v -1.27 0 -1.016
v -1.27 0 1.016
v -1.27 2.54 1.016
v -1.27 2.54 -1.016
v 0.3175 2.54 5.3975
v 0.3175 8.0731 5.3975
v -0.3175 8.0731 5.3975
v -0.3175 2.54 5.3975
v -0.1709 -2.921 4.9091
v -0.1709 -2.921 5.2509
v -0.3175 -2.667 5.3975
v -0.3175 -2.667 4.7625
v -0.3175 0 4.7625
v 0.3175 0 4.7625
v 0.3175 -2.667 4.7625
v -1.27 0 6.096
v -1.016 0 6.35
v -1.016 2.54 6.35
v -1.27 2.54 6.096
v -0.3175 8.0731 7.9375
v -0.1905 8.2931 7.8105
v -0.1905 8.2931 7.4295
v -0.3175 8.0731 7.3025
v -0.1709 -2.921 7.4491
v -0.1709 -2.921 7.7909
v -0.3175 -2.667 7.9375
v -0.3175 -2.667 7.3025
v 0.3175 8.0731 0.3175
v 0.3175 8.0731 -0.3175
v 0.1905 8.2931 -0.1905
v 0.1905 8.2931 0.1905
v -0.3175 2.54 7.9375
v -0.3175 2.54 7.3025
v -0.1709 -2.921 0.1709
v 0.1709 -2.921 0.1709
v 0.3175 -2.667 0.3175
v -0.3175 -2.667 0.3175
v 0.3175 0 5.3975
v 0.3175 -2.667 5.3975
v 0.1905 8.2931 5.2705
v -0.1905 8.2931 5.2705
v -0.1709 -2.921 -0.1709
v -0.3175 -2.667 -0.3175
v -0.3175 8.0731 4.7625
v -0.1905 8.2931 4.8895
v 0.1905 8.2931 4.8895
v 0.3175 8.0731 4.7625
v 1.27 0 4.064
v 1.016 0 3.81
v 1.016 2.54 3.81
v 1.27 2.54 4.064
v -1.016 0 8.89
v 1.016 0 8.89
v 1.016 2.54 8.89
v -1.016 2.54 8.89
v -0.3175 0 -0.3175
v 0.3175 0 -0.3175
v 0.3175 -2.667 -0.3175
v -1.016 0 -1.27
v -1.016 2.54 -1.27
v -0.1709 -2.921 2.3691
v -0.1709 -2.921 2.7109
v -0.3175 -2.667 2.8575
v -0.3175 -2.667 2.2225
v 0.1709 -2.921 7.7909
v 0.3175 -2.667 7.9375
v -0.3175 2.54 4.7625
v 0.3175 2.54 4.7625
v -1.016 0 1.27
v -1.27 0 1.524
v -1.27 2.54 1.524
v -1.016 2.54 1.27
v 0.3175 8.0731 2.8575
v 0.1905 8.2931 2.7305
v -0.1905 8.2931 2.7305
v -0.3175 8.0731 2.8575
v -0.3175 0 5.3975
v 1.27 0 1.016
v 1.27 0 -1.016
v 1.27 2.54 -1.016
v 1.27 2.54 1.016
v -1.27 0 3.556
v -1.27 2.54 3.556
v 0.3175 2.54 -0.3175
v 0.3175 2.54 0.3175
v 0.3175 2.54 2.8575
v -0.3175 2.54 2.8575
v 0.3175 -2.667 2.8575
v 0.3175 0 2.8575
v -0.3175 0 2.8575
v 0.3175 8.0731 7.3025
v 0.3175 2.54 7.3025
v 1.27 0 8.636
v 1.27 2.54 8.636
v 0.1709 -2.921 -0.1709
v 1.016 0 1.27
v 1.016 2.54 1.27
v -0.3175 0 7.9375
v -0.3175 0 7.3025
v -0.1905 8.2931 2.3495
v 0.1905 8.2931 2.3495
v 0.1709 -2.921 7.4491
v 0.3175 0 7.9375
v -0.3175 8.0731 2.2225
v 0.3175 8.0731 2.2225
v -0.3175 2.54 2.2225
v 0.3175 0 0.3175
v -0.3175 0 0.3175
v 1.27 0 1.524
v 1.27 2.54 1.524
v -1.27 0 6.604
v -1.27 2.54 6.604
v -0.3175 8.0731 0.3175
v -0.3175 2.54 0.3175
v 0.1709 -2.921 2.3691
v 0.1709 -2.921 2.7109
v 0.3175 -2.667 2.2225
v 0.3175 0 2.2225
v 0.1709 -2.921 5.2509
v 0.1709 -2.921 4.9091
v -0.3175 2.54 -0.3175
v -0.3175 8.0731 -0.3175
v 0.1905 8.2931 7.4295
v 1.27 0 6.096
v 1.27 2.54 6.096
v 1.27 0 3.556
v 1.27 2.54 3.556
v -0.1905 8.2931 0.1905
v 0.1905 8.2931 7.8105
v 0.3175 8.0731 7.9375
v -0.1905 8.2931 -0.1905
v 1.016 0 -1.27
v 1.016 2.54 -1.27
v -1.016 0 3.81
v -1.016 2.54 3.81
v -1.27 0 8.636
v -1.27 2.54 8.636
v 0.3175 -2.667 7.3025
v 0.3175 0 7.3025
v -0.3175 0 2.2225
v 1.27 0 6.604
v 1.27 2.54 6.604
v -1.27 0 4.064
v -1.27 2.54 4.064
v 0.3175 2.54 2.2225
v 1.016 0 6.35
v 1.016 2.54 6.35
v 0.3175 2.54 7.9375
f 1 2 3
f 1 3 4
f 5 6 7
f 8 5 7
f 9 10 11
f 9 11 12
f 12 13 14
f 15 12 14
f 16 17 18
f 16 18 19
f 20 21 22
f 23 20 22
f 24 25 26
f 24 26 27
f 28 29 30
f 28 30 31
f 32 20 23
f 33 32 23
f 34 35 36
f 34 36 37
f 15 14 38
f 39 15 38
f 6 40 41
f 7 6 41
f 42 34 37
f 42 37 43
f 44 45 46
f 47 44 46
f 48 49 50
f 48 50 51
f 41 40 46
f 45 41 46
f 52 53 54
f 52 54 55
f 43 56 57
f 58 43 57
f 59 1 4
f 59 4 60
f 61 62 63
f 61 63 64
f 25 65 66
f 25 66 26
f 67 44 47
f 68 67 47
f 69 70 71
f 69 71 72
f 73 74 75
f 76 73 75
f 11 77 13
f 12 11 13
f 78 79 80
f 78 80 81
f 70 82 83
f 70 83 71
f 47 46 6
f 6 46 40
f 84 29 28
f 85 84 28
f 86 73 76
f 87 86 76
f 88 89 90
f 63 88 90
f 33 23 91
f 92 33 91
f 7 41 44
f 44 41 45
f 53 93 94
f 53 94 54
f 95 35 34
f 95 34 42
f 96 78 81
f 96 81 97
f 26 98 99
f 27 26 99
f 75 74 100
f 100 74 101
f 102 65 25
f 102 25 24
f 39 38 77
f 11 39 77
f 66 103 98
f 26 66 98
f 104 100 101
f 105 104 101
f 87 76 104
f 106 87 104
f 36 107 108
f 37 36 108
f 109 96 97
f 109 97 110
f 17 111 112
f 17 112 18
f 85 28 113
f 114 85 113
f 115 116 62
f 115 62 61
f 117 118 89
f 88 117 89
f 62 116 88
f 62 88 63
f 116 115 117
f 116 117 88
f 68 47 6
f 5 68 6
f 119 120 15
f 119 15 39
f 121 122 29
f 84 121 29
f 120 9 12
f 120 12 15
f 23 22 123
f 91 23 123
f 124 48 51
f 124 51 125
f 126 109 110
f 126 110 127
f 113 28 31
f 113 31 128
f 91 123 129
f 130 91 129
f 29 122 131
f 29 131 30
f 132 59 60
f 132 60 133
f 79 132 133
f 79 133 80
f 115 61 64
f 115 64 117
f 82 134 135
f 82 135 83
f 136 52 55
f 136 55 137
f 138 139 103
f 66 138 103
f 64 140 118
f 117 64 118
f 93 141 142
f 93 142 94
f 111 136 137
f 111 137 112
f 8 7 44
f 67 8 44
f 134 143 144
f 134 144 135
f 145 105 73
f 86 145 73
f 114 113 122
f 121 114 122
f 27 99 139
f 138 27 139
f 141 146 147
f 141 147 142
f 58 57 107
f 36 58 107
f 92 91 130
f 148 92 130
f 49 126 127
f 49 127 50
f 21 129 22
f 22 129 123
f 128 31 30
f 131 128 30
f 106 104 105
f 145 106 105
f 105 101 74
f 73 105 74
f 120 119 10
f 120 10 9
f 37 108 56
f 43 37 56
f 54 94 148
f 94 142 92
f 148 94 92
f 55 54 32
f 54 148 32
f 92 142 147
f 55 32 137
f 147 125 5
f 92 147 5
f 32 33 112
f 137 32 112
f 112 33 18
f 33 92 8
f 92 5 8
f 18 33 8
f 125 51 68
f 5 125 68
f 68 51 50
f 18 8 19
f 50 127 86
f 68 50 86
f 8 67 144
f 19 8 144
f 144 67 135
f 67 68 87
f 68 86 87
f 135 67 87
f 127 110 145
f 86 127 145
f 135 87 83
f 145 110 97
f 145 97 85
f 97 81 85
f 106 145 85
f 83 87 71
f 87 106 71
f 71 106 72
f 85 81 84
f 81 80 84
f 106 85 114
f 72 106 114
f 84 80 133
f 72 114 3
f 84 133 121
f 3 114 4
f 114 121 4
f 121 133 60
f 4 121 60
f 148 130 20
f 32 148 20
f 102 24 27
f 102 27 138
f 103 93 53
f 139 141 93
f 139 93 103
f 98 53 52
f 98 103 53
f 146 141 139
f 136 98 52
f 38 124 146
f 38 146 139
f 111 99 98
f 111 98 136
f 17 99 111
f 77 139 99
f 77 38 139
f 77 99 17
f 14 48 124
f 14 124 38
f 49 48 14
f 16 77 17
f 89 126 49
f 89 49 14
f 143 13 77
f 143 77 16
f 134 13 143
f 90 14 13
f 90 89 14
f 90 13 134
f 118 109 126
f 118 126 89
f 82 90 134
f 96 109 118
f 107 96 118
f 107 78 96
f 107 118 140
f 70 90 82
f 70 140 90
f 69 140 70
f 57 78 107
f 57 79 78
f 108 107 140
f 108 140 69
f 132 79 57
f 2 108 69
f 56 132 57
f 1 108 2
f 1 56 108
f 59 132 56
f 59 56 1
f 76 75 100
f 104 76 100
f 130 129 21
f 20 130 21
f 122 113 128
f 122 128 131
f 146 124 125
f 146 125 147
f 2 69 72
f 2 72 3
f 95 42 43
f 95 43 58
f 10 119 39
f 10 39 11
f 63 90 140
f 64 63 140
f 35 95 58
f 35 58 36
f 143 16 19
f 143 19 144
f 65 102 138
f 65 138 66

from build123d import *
from OCP.BRepFilletAPI import BRepFilletAPI_MakeChamfer

# Parameters (mm, degrees)
BOSS_EXTRUDE1_DEPTH         = 2.54
SKETCH3_W                   = 0.635
SKETCH3_H                   = 0.635
CHAMFER1_SIZE               = 0.254
CHAMFER1_SIZE2              = 0.146646968
CHAMFER2_SIZE               = 0.127
CHAMFER2_SIZE2              = 0.219970453
LPATTERN1_COUNT             = 4
LPATTERN1_PITCH             = 2.54
CHAMFER1_OF_LPATTERN1_SIZE  = 0.254
CHAMFER1_OF_LPATTERN1_SIZE2 = 0.146646968
CHAMFER2_OF_LPATTERN1_SIZE2 = 0.127
CHAMFER2_OF_LPATTERN1_SIZE  = 0.219970453


with BuildPart() as part:
    # Sketch1 → Boss-Extrude1 (new body)
    with BuildSketch(Plane(origin=(0, 0, 0), x_dir=(1, 0, 0), z_dir=(0, 1, 0))):
        Polygon((1.016, 1.27), (1.27, 1.016), (1.27, -1.016), (1.016, -1.27), (-1.016, -1.27), (-1.27, -1.016), (-1.27, 1.016), (-1.016, 1.27), align=None)
    boss_extrude1 = extrude(amount=BOSS_EXTRUDE1_DEPTH)

    # Sweep1: sweep along a path in Sketch2
    with BuildLine(Plane.XY) as sweep1_path:
        Line((0, -2.921), (0, 0))
        Line((0, 0), (0, 8.2931))
    # Sketch3 → Sweep1 (sweep)
    with BuildSketch(Plane(origin=(0, -2.921, 0), x_dir=(-1, 0, 0), z_dir=(0, -1, 0))):
        Rectangle(SKETCH3_W, SKETCH3_H)
    sweep1 = sweep(path=sweep1_path.line)

    # Chamfer1: one chamfer whose edges measure the first distance from different faces: ONE call of the kernel's chamfer builder (chamfer() names one face for all edges)
    chamfer1_edges_1 = [part.edges().sort_by_distance(p)[0] for p in [
        (0.3175, -2.921, 0),
    ]]
    chamfer1_side_1 = [part.faces().sort_by_distance(p)[0] for p in [
        (0.3175, -1.4605, 0),
    ]]
    chamfer1_edges_2 = [part.edges().sort_by_distance(p)[0] for p in [
        (0, -2.921, 0.3175),
    ]]
    chamfer1_side_2 = [part.faces().sort_by_distance(p)[0] for p in [
        (0, -1.4605, 0.3175),
    ]]
    chamfer1_edges_3 = [part.edges().sort_by_distance(p)[0] for p in [
        (-0.3175, -2.921, 0),
    ]]
    chamfer1_side_3 = [part.faces().sort_by_distance(p)[0] for p in [
        (-0.3175, -1.4605, 0),
    ]]
    chamfer1_edges_4 = [part.edges().sort_by_distance(p)[0] for p in [
        (0, -2.921, -0.3175),
    ]]
    chamfer1_side_4 = [part.faces().sort_by_distance(p)[0] for p in [
        (0, -1.4605, -0.3175),
    ]]
    chamfer1 = BRepFilletAPI_MakeChamfer(part.part.solid().wrapped)
    for e in chamfer1_edges_1:
        chamfer1.Add(CHAMFER1_SIZE, CHAMFER1_SIZE2, e.wrapped, chamfer1_side_1[0].wrapped)  # the first distance lies on this face
    for e in chamfer1_edges_2:
        chamfer1.Add(CHAMFER1_SIZE, CHAMFER1_SIZE2, e.wrapped, chamfer1_side_2[0].wrapped)  # the first distance lies on this face
    for e in chamfer1_edges_3:
        chamfer1.Add(CHAMFER1_SIZE, CHAMFER1_SIZE2, e.wrapped, chamfer1_side_3[0].wrapped)  # the first distance lies on this face
    for e in chamfer1_edges_4:
        chamfer1.Add(CHAMFER1_SIZE, CHAMFER1_SIZE2, e.wrapped, chamfer1_side_4[0].wrapped)  # the first distance lies on this face
    add(Compound.cast(chamfer1.Shape()), mode=Mode.REPLACE)

    # Chamfer2
    chamfer2_edges = [part.edges().sort_by_distance(p)[0] for p in [
        (0.3175, 8.2931, 0),
        (0, 8.2931, 0.3175),
        (-0.3175, 8.2931, 0),
        (0, 8.2931, -0.3175),
    ]]
    chamfer2_side = [part.faces().sort_by_distance(p)[0] for p in [
        (0, 8.2931, 0),
    ]]
    chamfer(chamfer2_edges, length=CHAMFER2_SIZE, length2=CHAMFER2_SIZE2, reference=chamfer2_side[0])

    # LPattern1: Boss-Extrude1, Sweep1 ×4
    with Locations(*[(0, 0, i * LPATTERN1_PITCH) for i in range(1, LPATTERN1_COUNT)]):
        add(boss_extrude1)
        add(sweep1)

    # Chamfer1 of LPattern1: one chamfer whose edges measure the first distance from different faces: ONE call of the kernel's chamfer builder (chamfer() names one face for all edges)
    chamfer1_of_lpattern1_edges_1 = [part.edges().sort_by_distance(p)[0] for p in [
        (0.3175, -2.921, 2.54),
    ]]
    chamfer1_of_lpattern1_side_1 = [part.faces().sort_by_distance(p)[0] for p in [
        (0.3175, -1.4605, 2.54),
    ]]
    chamfer1_of_lpattern1_edges_2 = [part.edges().sort_by_distance(p)[0] for p in [
        (0, -2.921, 2.8575),
    ]]
    chamfer1_of_lpattern1_side_2 = [part.faces().sort_by_distance(p)[0] for p in [
        (0, -1.4605, 2.8575),
    ]]
    chamfer1_of_lpattern1_edges_3 = [part.edges().sort_by_distance(p)[0] for p in [
        (-0.3175, -2.921, 2.54),
    ]]
    chamfer1_of_lpattern1_side_3 = [part.faces().sort_by_distance(p)[0] for p in [
        (-0.3175, -1.4605, 2.54),
    ]]
    chamfer1_of_lpattern1_edges_4 = [part.edges().sort_by_distance(p)[0] for p in [
        (0, -2.921, 2.2225),
    ]]
    chamfer1_of_lpattern1_side_4 = [part.faces().sort_by_distance(p)[0] for p in [
        (0, -1.4605, 2.2225),
    ]]
    chamfer1_of_lpattern1_edges_5 = [part.edges().sort_by_distance(p)[0] for p in [
        (0.3175, -2.921, 5.08),
    ]]
    chamfer1_of_lpattern1_side_5 = [part.faces().sort_by_distance(p)[0] for p in [
        (0.3175, -1.4605, 5.08),
    ]]
    chamfer1_of_lpattern1_edges_6 = [part.edges().sort_by_distance(p)[0] for p in [
        (0, -2.921, 5.3975),
    ]]
    chamfer1_of_lpattern1_side_6 = [part.faces().sort_by_distance(p)[0] for p in [
        (0, -1.4605, 5.3975),
    ]]
    chamfer1_of_lpattern1_edges_7 = [part.edges().sort_by_distance(p)[0] for p in [
        (-0.3175, -2.921, 5.08),
    ]]
    chamfer1_of_lpattern1_side_7 = [part.faces().sort_by_distance(p)[0] for p in [
        (-0.3175, -1.4605, 5.08),
    ]]
    chamfer1_of_lpattern1_edges_8 = [part.edges().sort_by_distance(p)[0] for p in [
        (0, -2.921, 4.7625),
    ]]
    chamfer1_of_lpattern1_side_8 = [part.faces().sort_by_distance(p)[0] for p in [
        (0, -1.4605, 4.7625),
    ]]
    chamfer1_of_lpattern1_edges_9 = [part.edges().sort_by_distance(p)[0] for p in [
        (0.3175, -2.921, 7.62),
    ]]
    chamfer1_of_lpattern1_side_9 = [part.faces().sort_by_distance(p)[0] for p in [
        (0.3175, -1.4605, 7.62),
    ]]
    chamfer1_of_lpattern1_edges_10 = [part.edges().sort_by_distance(p)[0] for p in [
        (0, -2.921, 7.9375),
    ]]
    chamfer1_of_lpattern1_side_10 = [part.faces().sort_by_distance(p)[0] for p in [
        (0, -1.4605, 7.9375),
    ]]
    chamfer1_of_lpattern1_edges_11 = [part.edges().sort_by_distance(p)[0] for p in [
        (-0.3175, -2.921, 7.62),
    ]]
    chamfer1_of_lpattern1_side_11 = [part.faces().sort_by_distance(p)[0] for p in [
        (-0.3175, -1.4605, 7.62),
    ]]
    chamfer1_of_lpattern1_edges_12 = [part.edges().sort_by_distance(p)[0] for p in [
        (0, -2.921, 7.3025),
    ]]
    chamfer1_of_lpattern1_side_12 = [part.faces().sort_by_distance(p)[0] for p in [
        (0, -1.4605, 7.3025),
    ]]
    chamfer1_of_lpattern1 = BRepFilletAPI_MakeChamfer(part.part.solid().wrapped)
    for e in chamfer1_of_lpattern1_edges_1:
        chamfer1_of_lpattern1.Add(CHAMFER1_OF_LPATTERN1_SIZE, CHAMFER1_OF_LPATTERN1_SIZE2, e.wrapped, chamfer1_of_lpattern1_side_1[0].wrapped)  # the first distance lies on this face
    for e in chamfer1_of_lpattern1_edges_2:
        chamfer1_of_lpattern1.Add(CHAMFER1_OF_LPATTERN1_SIZE, CHAMFER1_OF_LPATTERN1_SIZE2, e.wrapped, chamfer1_of_lpattern1_side_2[0].wrapped)  # the first distance lies on this face
    for e in chamfer1_of_lpattern1_edges_3:
        chamfer1_of_lpattern1.Add(CHAMFER1_OF_LPATTERN1_SIZE, CHAMFER1_OF_LPATTERN1_SIZE2, e.wrapped, chamfer1_of_lpattern1_side_3[0].wrapped)  # the first distance lies on this face
    for e in chamfer1_of_lpattern1_edges_4:
        chamfer1_of_lpattern1.Add(CHAMFER1_OF_LPATTERN1_SIZE, CHAMFER1_OF_LPATTERN1_SIZE2, e.wrapped, chamfer1_of_lpattern1_side_4[0].wrapped)  # the first distance lies on this face
    for e in chamfer1_of_lpattern1_edges_5:
        chamfer1_of_lpattern1.Add(CHAMFER1_OF_LPATTERN1_SIZE, CHAMFER1_OF_LPATTERN1_SIZE2, e.wrapped, chamfer1_of_lpattern1_side_5[0].wrapped)  # the first distance lies on this face
    for e in chamfer1_of_lpattern1_edges_6:
        chamfer1_of_lpattern1.Add(CHAMFER1_OF_LPATTERN1_SIZE, CHAMFER1_OF_LPATTERN1_SIZE2, e.wrapped, chamfer1_of_lpattern1_side_6[0].wrapped)  # the first distance lies on this face
    for e in chamfer1_of_lpattern1_edges_7:
        chamfer1_of_lpattern1.Add(CHAMFER1_OF_LPATTERN1_SIZE, CHAMFER1_OF_LPATTERN1_SIZE2, e.wrapped, chamfer1_of_lpattern1_side_7[0].wrapped)  # the first distance lies on this face
    for e in chamfer1_of_lpattern1_edges_8:
        chamfer1_of_lpattern1.Add(CHAMFER1_OF_LPATTERN1_SIZE, CHAMFER1_OF_LPATTERN1_SIZE2, e.wrapped, chamfer1_of_lpattern1_side_8[0].wrapped)  # the first distance lies on this face
    for e in chamfer1_of_lpattern1_edges_9:
        chamfer1_of_lpattern1.Add(CHAMFER1_OF_LPATTERN1_SIZE, CHAMFER1_OF_LPATTERN1_SIZE2, e.wrapped, chamfer1_of_lpattern1_side_9[0].wrapped)  # the first distance lies on this face
    for e in chamfer1_of_lpattern1_edges_10:
        chamfer1_of_lpattern1.Add(CHAMFER1_OF_LPATTERN1_SIZE, CHAMFER1_OF_LPATTERN1_SIZE2, e.wrapped, chamfer1_of_lpattern1_side_10[0].wrapped)  # the first distance lies on this face
    for e in chamfer1_of_lpattern1_edges_11:
        chamfer1_of_lpattern1.Add(CHAMFER1_OF_LPATTERN1_SIZE, CHAMFER1_OF_LPATTERN1_SIZE2, e.wrapped, chamfer1_of_lpattern1_side_11[0].wrapped)  # the first distance lies on this face
    for e in chamfer1_of_lpattern1_edges_12:
        chamfer1_of_lpattern1.Add(CHAMFER1_OF_LPATTERN1_SIZE, CHAMFER1_OF_LPATTERN1_SIZE2, e.wrapped, chamfer1_of_lpattern1_side_12[0].wrapped)  # the first distance lies on this face
    add(Compound.cast(chamfer1_of_lpattern1.Shape()), mode=Mode.REPLACE)

    # Chamfer2 of LPattern1
    chamfer2_of_lpattern1_edges = [part.edges().sort_by_distance(p)[0] for p in [
        (0.3175, 8.2931, 2.54),
        (0, 8.2931, 2.8575),
        (-0.3175, 8.2931, 2.54),
        (0, 8.2931, 2.2225),
        (0.3175, 8.2931, 5.08),
        (0, 8.2931, 5.3975),
        (-0.3175, 8.2931, 5.08),
        (0, 8.2931, 4.7625),
        (0.3175, 8.2931, 7.62),
        (0, 8.2931, 7.9375),
        (-0.3175, 8.2931, 7.62),
        (0, 8.2931, 7.3025),
    ]]
    chamfer(chamfer2_of_lpattern1_edges, length=CHAMFER2_OF_LPATTERN1_SIZE, length2=CHAMFER2_OF_LPATTERN1_SIZE2)


solid = part.part
